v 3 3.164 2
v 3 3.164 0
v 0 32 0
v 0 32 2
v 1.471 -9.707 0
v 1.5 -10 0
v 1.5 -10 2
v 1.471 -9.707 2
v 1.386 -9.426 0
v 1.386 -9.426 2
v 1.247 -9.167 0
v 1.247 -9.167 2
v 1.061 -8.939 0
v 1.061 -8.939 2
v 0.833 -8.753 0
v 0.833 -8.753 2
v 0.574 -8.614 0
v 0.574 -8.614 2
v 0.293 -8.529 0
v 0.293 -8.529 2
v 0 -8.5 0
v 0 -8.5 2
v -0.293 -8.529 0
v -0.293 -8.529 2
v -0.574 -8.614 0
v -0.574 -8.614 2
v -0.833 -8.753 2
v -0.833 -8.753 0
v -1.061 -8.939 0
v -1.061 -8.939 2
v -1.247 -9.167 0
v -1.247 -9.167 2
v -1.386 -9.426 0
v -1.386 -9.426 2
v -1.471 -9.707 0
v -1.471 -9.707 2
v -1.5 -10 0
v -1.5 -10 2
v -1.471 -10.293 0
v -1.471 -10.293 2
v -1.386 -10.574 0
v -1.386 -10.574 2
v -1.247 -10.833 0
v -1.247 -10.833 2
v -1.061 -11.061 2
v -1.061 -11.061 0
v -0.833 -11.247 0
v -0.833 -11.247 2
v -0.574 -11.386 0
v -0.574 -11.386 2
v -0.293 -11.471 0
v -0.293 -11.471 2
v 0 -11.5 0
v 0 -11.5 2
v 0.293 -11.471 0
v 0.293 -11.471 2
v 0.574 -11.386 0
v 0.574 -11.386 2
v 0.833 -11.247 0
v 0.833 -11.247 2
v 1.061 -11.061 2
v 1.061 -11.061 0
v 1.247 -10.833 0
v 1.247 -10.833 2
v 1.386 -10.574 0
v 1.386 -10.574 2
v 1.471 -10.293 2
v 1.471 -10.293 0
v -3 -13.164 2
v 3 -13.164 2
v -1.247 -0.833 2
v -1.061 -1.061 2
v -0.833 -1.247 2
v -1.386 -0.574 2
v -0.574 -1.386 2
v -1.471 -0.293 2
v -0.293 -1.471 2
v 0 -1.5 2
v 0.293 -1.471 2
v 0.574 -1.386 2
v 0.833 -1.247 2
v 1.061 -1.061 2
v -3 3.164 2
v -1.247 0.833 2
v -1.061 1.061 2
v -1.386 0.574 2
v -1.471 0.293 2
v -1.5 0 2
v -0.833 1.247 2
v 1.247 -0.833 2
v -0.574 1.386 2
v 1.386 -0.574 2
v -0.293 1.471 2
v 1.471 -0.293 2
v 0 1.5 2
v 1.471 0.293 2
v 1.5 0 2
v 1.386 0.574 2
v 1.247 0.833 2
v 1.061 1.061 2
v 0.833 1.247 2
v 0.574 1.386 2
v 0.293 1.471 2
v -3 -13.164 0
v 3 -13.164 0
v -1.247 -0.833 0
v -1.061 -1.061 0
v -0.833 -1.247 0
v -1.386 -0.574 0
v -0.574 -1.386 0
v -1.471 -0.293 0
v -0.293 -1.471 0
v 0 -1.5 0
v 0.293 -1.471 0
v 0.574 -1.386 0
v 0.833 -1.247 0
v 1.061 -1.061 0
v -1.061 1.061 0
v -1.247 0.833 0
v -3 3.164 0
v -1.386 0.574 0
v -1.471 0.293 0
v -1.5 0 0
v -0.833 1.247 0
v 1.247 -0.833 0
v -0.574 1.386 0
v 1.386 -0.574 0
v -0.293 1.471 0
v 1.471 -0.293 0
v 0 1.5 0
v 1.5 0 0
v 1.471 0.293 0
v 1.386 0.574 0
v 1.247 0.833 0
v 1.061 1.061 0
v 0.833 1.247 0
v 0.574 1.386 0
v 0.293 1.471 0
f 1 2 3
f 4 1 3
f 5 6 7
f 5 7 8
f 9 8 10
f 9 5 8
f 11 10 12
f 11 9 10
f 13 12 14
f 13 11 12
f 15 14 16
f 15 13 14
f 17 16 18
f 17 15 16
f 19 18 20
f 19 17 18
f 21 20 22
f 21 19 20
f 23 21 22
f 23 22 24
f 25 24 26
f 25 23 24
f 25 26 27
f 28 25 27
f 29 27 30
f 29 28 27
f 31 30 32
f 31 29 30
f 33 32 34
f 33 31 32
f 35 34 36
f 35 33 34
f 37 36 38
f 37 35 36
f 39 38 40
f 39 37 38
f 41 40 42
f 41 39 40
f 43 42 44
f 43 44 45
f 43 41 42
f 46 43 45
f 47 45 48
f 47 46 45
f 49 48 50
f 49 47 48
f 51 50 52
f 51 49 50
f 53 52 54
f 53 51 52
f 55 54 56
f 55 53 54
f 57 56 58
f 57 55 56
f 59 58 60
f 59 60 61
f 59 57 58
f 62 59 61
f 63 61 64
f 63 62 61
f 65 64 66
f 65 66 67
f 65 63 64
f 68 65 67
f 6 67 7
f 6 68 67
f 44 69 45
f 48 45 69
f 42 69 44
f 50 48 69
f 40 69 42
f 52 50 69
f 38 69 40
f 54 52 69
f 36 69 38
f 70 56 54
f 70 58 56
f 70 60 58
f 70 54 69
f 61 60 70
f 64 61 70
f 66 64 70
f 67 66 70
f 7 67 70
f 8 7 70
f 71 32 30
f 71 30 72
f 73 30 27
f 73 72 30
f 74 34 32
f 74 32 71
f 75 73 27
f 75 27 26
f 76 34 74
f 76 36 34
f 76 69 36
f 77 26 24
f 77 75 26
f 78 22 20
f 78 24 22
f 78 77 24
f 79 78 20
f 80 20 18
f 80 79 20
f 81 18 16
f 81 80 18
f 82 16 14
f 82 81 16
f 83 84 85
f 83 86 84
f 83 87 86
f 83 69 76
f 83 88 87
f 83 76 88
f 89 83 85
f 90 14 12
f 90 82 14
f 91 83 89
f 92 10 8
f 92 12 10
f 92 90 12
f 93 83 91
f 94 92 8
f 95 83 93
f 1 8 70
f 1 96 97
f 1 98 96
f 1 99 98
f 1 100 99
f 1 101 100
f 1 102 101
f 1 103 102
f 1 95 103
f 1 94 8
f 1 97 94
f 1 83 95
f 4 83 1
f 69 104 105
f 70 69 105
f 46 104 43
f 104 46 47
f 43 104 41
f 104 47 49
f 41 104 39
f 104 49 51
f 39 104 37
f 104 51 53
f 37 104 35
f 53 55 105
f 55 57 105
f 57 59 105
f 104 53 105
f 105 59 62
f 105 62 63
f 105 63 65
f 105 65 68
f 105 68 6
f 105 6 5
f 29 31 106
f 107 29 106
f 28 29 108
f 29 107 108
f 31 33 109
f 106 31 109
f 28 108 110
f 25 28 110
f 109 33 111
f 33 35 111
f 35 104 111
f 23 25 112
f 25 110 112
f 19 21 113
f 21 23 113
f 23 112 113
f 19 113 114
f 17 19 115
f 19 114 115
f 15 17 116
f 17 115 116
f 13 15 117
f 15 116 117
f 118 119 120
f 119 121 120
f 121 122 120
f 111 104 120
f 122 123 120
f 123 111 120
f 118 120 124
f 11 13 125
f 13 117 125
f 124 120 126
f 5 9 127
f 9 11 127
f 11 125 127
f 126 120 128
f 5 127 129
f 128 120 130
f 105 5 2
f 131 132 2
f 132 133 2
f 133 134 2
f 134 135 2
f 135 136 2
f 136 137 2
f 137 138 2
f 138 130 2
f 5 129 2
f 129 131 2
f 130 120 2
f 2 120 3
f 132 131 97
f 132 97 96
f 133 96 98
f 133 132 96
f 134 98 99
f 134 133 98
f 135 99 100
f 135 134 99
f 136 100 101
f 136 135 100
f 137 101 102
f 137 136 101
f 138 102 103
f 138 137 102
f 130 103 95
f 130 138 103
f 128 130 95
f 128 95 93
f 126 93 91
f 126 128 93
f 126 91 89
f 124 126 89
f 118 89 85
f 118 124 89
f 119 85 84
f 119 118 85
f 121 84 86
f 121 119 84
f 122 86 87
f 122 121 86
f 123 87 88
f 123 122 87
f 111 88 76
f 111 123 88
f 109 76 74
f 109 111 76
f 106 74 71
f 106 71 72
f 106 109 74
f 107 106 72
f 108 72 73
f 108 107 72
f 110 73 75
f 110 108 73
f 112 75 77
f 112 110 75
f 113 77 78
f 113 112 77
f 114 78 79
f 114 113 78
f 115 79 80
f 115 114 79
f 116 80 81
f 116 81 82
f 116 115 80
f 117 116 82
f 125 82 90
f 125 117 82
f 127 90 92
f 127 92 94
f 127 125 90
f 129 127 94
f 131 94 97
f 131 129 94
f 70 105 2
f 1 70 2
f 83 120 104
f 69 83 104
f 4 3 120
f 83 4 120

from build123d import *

# Parameters (mm, degrees)
SKETCH_1_R      = 1.5
EXTRUDE_1_DEPTH = 2


with BuildPart() as part:
    # 草图1 → 凸台-拉伸1 (new body)
    with BuildSketch(Plane.XY):
        Polygon((3, 3.164176285), (0, 32), (-3, 3.164176285), (-3, -13.164176285), (3, -13.164176285), align=None)
        Circle(SKETCH_1_R, mode=Mode.SUBTRACT)
        with Locations((0, -10)):
            Circle(SKETCH_1_R, mode=Mode.SUBTRACT)
    extrude(amount=EXTRUDE_1_DEPTH)


solid = part.part
